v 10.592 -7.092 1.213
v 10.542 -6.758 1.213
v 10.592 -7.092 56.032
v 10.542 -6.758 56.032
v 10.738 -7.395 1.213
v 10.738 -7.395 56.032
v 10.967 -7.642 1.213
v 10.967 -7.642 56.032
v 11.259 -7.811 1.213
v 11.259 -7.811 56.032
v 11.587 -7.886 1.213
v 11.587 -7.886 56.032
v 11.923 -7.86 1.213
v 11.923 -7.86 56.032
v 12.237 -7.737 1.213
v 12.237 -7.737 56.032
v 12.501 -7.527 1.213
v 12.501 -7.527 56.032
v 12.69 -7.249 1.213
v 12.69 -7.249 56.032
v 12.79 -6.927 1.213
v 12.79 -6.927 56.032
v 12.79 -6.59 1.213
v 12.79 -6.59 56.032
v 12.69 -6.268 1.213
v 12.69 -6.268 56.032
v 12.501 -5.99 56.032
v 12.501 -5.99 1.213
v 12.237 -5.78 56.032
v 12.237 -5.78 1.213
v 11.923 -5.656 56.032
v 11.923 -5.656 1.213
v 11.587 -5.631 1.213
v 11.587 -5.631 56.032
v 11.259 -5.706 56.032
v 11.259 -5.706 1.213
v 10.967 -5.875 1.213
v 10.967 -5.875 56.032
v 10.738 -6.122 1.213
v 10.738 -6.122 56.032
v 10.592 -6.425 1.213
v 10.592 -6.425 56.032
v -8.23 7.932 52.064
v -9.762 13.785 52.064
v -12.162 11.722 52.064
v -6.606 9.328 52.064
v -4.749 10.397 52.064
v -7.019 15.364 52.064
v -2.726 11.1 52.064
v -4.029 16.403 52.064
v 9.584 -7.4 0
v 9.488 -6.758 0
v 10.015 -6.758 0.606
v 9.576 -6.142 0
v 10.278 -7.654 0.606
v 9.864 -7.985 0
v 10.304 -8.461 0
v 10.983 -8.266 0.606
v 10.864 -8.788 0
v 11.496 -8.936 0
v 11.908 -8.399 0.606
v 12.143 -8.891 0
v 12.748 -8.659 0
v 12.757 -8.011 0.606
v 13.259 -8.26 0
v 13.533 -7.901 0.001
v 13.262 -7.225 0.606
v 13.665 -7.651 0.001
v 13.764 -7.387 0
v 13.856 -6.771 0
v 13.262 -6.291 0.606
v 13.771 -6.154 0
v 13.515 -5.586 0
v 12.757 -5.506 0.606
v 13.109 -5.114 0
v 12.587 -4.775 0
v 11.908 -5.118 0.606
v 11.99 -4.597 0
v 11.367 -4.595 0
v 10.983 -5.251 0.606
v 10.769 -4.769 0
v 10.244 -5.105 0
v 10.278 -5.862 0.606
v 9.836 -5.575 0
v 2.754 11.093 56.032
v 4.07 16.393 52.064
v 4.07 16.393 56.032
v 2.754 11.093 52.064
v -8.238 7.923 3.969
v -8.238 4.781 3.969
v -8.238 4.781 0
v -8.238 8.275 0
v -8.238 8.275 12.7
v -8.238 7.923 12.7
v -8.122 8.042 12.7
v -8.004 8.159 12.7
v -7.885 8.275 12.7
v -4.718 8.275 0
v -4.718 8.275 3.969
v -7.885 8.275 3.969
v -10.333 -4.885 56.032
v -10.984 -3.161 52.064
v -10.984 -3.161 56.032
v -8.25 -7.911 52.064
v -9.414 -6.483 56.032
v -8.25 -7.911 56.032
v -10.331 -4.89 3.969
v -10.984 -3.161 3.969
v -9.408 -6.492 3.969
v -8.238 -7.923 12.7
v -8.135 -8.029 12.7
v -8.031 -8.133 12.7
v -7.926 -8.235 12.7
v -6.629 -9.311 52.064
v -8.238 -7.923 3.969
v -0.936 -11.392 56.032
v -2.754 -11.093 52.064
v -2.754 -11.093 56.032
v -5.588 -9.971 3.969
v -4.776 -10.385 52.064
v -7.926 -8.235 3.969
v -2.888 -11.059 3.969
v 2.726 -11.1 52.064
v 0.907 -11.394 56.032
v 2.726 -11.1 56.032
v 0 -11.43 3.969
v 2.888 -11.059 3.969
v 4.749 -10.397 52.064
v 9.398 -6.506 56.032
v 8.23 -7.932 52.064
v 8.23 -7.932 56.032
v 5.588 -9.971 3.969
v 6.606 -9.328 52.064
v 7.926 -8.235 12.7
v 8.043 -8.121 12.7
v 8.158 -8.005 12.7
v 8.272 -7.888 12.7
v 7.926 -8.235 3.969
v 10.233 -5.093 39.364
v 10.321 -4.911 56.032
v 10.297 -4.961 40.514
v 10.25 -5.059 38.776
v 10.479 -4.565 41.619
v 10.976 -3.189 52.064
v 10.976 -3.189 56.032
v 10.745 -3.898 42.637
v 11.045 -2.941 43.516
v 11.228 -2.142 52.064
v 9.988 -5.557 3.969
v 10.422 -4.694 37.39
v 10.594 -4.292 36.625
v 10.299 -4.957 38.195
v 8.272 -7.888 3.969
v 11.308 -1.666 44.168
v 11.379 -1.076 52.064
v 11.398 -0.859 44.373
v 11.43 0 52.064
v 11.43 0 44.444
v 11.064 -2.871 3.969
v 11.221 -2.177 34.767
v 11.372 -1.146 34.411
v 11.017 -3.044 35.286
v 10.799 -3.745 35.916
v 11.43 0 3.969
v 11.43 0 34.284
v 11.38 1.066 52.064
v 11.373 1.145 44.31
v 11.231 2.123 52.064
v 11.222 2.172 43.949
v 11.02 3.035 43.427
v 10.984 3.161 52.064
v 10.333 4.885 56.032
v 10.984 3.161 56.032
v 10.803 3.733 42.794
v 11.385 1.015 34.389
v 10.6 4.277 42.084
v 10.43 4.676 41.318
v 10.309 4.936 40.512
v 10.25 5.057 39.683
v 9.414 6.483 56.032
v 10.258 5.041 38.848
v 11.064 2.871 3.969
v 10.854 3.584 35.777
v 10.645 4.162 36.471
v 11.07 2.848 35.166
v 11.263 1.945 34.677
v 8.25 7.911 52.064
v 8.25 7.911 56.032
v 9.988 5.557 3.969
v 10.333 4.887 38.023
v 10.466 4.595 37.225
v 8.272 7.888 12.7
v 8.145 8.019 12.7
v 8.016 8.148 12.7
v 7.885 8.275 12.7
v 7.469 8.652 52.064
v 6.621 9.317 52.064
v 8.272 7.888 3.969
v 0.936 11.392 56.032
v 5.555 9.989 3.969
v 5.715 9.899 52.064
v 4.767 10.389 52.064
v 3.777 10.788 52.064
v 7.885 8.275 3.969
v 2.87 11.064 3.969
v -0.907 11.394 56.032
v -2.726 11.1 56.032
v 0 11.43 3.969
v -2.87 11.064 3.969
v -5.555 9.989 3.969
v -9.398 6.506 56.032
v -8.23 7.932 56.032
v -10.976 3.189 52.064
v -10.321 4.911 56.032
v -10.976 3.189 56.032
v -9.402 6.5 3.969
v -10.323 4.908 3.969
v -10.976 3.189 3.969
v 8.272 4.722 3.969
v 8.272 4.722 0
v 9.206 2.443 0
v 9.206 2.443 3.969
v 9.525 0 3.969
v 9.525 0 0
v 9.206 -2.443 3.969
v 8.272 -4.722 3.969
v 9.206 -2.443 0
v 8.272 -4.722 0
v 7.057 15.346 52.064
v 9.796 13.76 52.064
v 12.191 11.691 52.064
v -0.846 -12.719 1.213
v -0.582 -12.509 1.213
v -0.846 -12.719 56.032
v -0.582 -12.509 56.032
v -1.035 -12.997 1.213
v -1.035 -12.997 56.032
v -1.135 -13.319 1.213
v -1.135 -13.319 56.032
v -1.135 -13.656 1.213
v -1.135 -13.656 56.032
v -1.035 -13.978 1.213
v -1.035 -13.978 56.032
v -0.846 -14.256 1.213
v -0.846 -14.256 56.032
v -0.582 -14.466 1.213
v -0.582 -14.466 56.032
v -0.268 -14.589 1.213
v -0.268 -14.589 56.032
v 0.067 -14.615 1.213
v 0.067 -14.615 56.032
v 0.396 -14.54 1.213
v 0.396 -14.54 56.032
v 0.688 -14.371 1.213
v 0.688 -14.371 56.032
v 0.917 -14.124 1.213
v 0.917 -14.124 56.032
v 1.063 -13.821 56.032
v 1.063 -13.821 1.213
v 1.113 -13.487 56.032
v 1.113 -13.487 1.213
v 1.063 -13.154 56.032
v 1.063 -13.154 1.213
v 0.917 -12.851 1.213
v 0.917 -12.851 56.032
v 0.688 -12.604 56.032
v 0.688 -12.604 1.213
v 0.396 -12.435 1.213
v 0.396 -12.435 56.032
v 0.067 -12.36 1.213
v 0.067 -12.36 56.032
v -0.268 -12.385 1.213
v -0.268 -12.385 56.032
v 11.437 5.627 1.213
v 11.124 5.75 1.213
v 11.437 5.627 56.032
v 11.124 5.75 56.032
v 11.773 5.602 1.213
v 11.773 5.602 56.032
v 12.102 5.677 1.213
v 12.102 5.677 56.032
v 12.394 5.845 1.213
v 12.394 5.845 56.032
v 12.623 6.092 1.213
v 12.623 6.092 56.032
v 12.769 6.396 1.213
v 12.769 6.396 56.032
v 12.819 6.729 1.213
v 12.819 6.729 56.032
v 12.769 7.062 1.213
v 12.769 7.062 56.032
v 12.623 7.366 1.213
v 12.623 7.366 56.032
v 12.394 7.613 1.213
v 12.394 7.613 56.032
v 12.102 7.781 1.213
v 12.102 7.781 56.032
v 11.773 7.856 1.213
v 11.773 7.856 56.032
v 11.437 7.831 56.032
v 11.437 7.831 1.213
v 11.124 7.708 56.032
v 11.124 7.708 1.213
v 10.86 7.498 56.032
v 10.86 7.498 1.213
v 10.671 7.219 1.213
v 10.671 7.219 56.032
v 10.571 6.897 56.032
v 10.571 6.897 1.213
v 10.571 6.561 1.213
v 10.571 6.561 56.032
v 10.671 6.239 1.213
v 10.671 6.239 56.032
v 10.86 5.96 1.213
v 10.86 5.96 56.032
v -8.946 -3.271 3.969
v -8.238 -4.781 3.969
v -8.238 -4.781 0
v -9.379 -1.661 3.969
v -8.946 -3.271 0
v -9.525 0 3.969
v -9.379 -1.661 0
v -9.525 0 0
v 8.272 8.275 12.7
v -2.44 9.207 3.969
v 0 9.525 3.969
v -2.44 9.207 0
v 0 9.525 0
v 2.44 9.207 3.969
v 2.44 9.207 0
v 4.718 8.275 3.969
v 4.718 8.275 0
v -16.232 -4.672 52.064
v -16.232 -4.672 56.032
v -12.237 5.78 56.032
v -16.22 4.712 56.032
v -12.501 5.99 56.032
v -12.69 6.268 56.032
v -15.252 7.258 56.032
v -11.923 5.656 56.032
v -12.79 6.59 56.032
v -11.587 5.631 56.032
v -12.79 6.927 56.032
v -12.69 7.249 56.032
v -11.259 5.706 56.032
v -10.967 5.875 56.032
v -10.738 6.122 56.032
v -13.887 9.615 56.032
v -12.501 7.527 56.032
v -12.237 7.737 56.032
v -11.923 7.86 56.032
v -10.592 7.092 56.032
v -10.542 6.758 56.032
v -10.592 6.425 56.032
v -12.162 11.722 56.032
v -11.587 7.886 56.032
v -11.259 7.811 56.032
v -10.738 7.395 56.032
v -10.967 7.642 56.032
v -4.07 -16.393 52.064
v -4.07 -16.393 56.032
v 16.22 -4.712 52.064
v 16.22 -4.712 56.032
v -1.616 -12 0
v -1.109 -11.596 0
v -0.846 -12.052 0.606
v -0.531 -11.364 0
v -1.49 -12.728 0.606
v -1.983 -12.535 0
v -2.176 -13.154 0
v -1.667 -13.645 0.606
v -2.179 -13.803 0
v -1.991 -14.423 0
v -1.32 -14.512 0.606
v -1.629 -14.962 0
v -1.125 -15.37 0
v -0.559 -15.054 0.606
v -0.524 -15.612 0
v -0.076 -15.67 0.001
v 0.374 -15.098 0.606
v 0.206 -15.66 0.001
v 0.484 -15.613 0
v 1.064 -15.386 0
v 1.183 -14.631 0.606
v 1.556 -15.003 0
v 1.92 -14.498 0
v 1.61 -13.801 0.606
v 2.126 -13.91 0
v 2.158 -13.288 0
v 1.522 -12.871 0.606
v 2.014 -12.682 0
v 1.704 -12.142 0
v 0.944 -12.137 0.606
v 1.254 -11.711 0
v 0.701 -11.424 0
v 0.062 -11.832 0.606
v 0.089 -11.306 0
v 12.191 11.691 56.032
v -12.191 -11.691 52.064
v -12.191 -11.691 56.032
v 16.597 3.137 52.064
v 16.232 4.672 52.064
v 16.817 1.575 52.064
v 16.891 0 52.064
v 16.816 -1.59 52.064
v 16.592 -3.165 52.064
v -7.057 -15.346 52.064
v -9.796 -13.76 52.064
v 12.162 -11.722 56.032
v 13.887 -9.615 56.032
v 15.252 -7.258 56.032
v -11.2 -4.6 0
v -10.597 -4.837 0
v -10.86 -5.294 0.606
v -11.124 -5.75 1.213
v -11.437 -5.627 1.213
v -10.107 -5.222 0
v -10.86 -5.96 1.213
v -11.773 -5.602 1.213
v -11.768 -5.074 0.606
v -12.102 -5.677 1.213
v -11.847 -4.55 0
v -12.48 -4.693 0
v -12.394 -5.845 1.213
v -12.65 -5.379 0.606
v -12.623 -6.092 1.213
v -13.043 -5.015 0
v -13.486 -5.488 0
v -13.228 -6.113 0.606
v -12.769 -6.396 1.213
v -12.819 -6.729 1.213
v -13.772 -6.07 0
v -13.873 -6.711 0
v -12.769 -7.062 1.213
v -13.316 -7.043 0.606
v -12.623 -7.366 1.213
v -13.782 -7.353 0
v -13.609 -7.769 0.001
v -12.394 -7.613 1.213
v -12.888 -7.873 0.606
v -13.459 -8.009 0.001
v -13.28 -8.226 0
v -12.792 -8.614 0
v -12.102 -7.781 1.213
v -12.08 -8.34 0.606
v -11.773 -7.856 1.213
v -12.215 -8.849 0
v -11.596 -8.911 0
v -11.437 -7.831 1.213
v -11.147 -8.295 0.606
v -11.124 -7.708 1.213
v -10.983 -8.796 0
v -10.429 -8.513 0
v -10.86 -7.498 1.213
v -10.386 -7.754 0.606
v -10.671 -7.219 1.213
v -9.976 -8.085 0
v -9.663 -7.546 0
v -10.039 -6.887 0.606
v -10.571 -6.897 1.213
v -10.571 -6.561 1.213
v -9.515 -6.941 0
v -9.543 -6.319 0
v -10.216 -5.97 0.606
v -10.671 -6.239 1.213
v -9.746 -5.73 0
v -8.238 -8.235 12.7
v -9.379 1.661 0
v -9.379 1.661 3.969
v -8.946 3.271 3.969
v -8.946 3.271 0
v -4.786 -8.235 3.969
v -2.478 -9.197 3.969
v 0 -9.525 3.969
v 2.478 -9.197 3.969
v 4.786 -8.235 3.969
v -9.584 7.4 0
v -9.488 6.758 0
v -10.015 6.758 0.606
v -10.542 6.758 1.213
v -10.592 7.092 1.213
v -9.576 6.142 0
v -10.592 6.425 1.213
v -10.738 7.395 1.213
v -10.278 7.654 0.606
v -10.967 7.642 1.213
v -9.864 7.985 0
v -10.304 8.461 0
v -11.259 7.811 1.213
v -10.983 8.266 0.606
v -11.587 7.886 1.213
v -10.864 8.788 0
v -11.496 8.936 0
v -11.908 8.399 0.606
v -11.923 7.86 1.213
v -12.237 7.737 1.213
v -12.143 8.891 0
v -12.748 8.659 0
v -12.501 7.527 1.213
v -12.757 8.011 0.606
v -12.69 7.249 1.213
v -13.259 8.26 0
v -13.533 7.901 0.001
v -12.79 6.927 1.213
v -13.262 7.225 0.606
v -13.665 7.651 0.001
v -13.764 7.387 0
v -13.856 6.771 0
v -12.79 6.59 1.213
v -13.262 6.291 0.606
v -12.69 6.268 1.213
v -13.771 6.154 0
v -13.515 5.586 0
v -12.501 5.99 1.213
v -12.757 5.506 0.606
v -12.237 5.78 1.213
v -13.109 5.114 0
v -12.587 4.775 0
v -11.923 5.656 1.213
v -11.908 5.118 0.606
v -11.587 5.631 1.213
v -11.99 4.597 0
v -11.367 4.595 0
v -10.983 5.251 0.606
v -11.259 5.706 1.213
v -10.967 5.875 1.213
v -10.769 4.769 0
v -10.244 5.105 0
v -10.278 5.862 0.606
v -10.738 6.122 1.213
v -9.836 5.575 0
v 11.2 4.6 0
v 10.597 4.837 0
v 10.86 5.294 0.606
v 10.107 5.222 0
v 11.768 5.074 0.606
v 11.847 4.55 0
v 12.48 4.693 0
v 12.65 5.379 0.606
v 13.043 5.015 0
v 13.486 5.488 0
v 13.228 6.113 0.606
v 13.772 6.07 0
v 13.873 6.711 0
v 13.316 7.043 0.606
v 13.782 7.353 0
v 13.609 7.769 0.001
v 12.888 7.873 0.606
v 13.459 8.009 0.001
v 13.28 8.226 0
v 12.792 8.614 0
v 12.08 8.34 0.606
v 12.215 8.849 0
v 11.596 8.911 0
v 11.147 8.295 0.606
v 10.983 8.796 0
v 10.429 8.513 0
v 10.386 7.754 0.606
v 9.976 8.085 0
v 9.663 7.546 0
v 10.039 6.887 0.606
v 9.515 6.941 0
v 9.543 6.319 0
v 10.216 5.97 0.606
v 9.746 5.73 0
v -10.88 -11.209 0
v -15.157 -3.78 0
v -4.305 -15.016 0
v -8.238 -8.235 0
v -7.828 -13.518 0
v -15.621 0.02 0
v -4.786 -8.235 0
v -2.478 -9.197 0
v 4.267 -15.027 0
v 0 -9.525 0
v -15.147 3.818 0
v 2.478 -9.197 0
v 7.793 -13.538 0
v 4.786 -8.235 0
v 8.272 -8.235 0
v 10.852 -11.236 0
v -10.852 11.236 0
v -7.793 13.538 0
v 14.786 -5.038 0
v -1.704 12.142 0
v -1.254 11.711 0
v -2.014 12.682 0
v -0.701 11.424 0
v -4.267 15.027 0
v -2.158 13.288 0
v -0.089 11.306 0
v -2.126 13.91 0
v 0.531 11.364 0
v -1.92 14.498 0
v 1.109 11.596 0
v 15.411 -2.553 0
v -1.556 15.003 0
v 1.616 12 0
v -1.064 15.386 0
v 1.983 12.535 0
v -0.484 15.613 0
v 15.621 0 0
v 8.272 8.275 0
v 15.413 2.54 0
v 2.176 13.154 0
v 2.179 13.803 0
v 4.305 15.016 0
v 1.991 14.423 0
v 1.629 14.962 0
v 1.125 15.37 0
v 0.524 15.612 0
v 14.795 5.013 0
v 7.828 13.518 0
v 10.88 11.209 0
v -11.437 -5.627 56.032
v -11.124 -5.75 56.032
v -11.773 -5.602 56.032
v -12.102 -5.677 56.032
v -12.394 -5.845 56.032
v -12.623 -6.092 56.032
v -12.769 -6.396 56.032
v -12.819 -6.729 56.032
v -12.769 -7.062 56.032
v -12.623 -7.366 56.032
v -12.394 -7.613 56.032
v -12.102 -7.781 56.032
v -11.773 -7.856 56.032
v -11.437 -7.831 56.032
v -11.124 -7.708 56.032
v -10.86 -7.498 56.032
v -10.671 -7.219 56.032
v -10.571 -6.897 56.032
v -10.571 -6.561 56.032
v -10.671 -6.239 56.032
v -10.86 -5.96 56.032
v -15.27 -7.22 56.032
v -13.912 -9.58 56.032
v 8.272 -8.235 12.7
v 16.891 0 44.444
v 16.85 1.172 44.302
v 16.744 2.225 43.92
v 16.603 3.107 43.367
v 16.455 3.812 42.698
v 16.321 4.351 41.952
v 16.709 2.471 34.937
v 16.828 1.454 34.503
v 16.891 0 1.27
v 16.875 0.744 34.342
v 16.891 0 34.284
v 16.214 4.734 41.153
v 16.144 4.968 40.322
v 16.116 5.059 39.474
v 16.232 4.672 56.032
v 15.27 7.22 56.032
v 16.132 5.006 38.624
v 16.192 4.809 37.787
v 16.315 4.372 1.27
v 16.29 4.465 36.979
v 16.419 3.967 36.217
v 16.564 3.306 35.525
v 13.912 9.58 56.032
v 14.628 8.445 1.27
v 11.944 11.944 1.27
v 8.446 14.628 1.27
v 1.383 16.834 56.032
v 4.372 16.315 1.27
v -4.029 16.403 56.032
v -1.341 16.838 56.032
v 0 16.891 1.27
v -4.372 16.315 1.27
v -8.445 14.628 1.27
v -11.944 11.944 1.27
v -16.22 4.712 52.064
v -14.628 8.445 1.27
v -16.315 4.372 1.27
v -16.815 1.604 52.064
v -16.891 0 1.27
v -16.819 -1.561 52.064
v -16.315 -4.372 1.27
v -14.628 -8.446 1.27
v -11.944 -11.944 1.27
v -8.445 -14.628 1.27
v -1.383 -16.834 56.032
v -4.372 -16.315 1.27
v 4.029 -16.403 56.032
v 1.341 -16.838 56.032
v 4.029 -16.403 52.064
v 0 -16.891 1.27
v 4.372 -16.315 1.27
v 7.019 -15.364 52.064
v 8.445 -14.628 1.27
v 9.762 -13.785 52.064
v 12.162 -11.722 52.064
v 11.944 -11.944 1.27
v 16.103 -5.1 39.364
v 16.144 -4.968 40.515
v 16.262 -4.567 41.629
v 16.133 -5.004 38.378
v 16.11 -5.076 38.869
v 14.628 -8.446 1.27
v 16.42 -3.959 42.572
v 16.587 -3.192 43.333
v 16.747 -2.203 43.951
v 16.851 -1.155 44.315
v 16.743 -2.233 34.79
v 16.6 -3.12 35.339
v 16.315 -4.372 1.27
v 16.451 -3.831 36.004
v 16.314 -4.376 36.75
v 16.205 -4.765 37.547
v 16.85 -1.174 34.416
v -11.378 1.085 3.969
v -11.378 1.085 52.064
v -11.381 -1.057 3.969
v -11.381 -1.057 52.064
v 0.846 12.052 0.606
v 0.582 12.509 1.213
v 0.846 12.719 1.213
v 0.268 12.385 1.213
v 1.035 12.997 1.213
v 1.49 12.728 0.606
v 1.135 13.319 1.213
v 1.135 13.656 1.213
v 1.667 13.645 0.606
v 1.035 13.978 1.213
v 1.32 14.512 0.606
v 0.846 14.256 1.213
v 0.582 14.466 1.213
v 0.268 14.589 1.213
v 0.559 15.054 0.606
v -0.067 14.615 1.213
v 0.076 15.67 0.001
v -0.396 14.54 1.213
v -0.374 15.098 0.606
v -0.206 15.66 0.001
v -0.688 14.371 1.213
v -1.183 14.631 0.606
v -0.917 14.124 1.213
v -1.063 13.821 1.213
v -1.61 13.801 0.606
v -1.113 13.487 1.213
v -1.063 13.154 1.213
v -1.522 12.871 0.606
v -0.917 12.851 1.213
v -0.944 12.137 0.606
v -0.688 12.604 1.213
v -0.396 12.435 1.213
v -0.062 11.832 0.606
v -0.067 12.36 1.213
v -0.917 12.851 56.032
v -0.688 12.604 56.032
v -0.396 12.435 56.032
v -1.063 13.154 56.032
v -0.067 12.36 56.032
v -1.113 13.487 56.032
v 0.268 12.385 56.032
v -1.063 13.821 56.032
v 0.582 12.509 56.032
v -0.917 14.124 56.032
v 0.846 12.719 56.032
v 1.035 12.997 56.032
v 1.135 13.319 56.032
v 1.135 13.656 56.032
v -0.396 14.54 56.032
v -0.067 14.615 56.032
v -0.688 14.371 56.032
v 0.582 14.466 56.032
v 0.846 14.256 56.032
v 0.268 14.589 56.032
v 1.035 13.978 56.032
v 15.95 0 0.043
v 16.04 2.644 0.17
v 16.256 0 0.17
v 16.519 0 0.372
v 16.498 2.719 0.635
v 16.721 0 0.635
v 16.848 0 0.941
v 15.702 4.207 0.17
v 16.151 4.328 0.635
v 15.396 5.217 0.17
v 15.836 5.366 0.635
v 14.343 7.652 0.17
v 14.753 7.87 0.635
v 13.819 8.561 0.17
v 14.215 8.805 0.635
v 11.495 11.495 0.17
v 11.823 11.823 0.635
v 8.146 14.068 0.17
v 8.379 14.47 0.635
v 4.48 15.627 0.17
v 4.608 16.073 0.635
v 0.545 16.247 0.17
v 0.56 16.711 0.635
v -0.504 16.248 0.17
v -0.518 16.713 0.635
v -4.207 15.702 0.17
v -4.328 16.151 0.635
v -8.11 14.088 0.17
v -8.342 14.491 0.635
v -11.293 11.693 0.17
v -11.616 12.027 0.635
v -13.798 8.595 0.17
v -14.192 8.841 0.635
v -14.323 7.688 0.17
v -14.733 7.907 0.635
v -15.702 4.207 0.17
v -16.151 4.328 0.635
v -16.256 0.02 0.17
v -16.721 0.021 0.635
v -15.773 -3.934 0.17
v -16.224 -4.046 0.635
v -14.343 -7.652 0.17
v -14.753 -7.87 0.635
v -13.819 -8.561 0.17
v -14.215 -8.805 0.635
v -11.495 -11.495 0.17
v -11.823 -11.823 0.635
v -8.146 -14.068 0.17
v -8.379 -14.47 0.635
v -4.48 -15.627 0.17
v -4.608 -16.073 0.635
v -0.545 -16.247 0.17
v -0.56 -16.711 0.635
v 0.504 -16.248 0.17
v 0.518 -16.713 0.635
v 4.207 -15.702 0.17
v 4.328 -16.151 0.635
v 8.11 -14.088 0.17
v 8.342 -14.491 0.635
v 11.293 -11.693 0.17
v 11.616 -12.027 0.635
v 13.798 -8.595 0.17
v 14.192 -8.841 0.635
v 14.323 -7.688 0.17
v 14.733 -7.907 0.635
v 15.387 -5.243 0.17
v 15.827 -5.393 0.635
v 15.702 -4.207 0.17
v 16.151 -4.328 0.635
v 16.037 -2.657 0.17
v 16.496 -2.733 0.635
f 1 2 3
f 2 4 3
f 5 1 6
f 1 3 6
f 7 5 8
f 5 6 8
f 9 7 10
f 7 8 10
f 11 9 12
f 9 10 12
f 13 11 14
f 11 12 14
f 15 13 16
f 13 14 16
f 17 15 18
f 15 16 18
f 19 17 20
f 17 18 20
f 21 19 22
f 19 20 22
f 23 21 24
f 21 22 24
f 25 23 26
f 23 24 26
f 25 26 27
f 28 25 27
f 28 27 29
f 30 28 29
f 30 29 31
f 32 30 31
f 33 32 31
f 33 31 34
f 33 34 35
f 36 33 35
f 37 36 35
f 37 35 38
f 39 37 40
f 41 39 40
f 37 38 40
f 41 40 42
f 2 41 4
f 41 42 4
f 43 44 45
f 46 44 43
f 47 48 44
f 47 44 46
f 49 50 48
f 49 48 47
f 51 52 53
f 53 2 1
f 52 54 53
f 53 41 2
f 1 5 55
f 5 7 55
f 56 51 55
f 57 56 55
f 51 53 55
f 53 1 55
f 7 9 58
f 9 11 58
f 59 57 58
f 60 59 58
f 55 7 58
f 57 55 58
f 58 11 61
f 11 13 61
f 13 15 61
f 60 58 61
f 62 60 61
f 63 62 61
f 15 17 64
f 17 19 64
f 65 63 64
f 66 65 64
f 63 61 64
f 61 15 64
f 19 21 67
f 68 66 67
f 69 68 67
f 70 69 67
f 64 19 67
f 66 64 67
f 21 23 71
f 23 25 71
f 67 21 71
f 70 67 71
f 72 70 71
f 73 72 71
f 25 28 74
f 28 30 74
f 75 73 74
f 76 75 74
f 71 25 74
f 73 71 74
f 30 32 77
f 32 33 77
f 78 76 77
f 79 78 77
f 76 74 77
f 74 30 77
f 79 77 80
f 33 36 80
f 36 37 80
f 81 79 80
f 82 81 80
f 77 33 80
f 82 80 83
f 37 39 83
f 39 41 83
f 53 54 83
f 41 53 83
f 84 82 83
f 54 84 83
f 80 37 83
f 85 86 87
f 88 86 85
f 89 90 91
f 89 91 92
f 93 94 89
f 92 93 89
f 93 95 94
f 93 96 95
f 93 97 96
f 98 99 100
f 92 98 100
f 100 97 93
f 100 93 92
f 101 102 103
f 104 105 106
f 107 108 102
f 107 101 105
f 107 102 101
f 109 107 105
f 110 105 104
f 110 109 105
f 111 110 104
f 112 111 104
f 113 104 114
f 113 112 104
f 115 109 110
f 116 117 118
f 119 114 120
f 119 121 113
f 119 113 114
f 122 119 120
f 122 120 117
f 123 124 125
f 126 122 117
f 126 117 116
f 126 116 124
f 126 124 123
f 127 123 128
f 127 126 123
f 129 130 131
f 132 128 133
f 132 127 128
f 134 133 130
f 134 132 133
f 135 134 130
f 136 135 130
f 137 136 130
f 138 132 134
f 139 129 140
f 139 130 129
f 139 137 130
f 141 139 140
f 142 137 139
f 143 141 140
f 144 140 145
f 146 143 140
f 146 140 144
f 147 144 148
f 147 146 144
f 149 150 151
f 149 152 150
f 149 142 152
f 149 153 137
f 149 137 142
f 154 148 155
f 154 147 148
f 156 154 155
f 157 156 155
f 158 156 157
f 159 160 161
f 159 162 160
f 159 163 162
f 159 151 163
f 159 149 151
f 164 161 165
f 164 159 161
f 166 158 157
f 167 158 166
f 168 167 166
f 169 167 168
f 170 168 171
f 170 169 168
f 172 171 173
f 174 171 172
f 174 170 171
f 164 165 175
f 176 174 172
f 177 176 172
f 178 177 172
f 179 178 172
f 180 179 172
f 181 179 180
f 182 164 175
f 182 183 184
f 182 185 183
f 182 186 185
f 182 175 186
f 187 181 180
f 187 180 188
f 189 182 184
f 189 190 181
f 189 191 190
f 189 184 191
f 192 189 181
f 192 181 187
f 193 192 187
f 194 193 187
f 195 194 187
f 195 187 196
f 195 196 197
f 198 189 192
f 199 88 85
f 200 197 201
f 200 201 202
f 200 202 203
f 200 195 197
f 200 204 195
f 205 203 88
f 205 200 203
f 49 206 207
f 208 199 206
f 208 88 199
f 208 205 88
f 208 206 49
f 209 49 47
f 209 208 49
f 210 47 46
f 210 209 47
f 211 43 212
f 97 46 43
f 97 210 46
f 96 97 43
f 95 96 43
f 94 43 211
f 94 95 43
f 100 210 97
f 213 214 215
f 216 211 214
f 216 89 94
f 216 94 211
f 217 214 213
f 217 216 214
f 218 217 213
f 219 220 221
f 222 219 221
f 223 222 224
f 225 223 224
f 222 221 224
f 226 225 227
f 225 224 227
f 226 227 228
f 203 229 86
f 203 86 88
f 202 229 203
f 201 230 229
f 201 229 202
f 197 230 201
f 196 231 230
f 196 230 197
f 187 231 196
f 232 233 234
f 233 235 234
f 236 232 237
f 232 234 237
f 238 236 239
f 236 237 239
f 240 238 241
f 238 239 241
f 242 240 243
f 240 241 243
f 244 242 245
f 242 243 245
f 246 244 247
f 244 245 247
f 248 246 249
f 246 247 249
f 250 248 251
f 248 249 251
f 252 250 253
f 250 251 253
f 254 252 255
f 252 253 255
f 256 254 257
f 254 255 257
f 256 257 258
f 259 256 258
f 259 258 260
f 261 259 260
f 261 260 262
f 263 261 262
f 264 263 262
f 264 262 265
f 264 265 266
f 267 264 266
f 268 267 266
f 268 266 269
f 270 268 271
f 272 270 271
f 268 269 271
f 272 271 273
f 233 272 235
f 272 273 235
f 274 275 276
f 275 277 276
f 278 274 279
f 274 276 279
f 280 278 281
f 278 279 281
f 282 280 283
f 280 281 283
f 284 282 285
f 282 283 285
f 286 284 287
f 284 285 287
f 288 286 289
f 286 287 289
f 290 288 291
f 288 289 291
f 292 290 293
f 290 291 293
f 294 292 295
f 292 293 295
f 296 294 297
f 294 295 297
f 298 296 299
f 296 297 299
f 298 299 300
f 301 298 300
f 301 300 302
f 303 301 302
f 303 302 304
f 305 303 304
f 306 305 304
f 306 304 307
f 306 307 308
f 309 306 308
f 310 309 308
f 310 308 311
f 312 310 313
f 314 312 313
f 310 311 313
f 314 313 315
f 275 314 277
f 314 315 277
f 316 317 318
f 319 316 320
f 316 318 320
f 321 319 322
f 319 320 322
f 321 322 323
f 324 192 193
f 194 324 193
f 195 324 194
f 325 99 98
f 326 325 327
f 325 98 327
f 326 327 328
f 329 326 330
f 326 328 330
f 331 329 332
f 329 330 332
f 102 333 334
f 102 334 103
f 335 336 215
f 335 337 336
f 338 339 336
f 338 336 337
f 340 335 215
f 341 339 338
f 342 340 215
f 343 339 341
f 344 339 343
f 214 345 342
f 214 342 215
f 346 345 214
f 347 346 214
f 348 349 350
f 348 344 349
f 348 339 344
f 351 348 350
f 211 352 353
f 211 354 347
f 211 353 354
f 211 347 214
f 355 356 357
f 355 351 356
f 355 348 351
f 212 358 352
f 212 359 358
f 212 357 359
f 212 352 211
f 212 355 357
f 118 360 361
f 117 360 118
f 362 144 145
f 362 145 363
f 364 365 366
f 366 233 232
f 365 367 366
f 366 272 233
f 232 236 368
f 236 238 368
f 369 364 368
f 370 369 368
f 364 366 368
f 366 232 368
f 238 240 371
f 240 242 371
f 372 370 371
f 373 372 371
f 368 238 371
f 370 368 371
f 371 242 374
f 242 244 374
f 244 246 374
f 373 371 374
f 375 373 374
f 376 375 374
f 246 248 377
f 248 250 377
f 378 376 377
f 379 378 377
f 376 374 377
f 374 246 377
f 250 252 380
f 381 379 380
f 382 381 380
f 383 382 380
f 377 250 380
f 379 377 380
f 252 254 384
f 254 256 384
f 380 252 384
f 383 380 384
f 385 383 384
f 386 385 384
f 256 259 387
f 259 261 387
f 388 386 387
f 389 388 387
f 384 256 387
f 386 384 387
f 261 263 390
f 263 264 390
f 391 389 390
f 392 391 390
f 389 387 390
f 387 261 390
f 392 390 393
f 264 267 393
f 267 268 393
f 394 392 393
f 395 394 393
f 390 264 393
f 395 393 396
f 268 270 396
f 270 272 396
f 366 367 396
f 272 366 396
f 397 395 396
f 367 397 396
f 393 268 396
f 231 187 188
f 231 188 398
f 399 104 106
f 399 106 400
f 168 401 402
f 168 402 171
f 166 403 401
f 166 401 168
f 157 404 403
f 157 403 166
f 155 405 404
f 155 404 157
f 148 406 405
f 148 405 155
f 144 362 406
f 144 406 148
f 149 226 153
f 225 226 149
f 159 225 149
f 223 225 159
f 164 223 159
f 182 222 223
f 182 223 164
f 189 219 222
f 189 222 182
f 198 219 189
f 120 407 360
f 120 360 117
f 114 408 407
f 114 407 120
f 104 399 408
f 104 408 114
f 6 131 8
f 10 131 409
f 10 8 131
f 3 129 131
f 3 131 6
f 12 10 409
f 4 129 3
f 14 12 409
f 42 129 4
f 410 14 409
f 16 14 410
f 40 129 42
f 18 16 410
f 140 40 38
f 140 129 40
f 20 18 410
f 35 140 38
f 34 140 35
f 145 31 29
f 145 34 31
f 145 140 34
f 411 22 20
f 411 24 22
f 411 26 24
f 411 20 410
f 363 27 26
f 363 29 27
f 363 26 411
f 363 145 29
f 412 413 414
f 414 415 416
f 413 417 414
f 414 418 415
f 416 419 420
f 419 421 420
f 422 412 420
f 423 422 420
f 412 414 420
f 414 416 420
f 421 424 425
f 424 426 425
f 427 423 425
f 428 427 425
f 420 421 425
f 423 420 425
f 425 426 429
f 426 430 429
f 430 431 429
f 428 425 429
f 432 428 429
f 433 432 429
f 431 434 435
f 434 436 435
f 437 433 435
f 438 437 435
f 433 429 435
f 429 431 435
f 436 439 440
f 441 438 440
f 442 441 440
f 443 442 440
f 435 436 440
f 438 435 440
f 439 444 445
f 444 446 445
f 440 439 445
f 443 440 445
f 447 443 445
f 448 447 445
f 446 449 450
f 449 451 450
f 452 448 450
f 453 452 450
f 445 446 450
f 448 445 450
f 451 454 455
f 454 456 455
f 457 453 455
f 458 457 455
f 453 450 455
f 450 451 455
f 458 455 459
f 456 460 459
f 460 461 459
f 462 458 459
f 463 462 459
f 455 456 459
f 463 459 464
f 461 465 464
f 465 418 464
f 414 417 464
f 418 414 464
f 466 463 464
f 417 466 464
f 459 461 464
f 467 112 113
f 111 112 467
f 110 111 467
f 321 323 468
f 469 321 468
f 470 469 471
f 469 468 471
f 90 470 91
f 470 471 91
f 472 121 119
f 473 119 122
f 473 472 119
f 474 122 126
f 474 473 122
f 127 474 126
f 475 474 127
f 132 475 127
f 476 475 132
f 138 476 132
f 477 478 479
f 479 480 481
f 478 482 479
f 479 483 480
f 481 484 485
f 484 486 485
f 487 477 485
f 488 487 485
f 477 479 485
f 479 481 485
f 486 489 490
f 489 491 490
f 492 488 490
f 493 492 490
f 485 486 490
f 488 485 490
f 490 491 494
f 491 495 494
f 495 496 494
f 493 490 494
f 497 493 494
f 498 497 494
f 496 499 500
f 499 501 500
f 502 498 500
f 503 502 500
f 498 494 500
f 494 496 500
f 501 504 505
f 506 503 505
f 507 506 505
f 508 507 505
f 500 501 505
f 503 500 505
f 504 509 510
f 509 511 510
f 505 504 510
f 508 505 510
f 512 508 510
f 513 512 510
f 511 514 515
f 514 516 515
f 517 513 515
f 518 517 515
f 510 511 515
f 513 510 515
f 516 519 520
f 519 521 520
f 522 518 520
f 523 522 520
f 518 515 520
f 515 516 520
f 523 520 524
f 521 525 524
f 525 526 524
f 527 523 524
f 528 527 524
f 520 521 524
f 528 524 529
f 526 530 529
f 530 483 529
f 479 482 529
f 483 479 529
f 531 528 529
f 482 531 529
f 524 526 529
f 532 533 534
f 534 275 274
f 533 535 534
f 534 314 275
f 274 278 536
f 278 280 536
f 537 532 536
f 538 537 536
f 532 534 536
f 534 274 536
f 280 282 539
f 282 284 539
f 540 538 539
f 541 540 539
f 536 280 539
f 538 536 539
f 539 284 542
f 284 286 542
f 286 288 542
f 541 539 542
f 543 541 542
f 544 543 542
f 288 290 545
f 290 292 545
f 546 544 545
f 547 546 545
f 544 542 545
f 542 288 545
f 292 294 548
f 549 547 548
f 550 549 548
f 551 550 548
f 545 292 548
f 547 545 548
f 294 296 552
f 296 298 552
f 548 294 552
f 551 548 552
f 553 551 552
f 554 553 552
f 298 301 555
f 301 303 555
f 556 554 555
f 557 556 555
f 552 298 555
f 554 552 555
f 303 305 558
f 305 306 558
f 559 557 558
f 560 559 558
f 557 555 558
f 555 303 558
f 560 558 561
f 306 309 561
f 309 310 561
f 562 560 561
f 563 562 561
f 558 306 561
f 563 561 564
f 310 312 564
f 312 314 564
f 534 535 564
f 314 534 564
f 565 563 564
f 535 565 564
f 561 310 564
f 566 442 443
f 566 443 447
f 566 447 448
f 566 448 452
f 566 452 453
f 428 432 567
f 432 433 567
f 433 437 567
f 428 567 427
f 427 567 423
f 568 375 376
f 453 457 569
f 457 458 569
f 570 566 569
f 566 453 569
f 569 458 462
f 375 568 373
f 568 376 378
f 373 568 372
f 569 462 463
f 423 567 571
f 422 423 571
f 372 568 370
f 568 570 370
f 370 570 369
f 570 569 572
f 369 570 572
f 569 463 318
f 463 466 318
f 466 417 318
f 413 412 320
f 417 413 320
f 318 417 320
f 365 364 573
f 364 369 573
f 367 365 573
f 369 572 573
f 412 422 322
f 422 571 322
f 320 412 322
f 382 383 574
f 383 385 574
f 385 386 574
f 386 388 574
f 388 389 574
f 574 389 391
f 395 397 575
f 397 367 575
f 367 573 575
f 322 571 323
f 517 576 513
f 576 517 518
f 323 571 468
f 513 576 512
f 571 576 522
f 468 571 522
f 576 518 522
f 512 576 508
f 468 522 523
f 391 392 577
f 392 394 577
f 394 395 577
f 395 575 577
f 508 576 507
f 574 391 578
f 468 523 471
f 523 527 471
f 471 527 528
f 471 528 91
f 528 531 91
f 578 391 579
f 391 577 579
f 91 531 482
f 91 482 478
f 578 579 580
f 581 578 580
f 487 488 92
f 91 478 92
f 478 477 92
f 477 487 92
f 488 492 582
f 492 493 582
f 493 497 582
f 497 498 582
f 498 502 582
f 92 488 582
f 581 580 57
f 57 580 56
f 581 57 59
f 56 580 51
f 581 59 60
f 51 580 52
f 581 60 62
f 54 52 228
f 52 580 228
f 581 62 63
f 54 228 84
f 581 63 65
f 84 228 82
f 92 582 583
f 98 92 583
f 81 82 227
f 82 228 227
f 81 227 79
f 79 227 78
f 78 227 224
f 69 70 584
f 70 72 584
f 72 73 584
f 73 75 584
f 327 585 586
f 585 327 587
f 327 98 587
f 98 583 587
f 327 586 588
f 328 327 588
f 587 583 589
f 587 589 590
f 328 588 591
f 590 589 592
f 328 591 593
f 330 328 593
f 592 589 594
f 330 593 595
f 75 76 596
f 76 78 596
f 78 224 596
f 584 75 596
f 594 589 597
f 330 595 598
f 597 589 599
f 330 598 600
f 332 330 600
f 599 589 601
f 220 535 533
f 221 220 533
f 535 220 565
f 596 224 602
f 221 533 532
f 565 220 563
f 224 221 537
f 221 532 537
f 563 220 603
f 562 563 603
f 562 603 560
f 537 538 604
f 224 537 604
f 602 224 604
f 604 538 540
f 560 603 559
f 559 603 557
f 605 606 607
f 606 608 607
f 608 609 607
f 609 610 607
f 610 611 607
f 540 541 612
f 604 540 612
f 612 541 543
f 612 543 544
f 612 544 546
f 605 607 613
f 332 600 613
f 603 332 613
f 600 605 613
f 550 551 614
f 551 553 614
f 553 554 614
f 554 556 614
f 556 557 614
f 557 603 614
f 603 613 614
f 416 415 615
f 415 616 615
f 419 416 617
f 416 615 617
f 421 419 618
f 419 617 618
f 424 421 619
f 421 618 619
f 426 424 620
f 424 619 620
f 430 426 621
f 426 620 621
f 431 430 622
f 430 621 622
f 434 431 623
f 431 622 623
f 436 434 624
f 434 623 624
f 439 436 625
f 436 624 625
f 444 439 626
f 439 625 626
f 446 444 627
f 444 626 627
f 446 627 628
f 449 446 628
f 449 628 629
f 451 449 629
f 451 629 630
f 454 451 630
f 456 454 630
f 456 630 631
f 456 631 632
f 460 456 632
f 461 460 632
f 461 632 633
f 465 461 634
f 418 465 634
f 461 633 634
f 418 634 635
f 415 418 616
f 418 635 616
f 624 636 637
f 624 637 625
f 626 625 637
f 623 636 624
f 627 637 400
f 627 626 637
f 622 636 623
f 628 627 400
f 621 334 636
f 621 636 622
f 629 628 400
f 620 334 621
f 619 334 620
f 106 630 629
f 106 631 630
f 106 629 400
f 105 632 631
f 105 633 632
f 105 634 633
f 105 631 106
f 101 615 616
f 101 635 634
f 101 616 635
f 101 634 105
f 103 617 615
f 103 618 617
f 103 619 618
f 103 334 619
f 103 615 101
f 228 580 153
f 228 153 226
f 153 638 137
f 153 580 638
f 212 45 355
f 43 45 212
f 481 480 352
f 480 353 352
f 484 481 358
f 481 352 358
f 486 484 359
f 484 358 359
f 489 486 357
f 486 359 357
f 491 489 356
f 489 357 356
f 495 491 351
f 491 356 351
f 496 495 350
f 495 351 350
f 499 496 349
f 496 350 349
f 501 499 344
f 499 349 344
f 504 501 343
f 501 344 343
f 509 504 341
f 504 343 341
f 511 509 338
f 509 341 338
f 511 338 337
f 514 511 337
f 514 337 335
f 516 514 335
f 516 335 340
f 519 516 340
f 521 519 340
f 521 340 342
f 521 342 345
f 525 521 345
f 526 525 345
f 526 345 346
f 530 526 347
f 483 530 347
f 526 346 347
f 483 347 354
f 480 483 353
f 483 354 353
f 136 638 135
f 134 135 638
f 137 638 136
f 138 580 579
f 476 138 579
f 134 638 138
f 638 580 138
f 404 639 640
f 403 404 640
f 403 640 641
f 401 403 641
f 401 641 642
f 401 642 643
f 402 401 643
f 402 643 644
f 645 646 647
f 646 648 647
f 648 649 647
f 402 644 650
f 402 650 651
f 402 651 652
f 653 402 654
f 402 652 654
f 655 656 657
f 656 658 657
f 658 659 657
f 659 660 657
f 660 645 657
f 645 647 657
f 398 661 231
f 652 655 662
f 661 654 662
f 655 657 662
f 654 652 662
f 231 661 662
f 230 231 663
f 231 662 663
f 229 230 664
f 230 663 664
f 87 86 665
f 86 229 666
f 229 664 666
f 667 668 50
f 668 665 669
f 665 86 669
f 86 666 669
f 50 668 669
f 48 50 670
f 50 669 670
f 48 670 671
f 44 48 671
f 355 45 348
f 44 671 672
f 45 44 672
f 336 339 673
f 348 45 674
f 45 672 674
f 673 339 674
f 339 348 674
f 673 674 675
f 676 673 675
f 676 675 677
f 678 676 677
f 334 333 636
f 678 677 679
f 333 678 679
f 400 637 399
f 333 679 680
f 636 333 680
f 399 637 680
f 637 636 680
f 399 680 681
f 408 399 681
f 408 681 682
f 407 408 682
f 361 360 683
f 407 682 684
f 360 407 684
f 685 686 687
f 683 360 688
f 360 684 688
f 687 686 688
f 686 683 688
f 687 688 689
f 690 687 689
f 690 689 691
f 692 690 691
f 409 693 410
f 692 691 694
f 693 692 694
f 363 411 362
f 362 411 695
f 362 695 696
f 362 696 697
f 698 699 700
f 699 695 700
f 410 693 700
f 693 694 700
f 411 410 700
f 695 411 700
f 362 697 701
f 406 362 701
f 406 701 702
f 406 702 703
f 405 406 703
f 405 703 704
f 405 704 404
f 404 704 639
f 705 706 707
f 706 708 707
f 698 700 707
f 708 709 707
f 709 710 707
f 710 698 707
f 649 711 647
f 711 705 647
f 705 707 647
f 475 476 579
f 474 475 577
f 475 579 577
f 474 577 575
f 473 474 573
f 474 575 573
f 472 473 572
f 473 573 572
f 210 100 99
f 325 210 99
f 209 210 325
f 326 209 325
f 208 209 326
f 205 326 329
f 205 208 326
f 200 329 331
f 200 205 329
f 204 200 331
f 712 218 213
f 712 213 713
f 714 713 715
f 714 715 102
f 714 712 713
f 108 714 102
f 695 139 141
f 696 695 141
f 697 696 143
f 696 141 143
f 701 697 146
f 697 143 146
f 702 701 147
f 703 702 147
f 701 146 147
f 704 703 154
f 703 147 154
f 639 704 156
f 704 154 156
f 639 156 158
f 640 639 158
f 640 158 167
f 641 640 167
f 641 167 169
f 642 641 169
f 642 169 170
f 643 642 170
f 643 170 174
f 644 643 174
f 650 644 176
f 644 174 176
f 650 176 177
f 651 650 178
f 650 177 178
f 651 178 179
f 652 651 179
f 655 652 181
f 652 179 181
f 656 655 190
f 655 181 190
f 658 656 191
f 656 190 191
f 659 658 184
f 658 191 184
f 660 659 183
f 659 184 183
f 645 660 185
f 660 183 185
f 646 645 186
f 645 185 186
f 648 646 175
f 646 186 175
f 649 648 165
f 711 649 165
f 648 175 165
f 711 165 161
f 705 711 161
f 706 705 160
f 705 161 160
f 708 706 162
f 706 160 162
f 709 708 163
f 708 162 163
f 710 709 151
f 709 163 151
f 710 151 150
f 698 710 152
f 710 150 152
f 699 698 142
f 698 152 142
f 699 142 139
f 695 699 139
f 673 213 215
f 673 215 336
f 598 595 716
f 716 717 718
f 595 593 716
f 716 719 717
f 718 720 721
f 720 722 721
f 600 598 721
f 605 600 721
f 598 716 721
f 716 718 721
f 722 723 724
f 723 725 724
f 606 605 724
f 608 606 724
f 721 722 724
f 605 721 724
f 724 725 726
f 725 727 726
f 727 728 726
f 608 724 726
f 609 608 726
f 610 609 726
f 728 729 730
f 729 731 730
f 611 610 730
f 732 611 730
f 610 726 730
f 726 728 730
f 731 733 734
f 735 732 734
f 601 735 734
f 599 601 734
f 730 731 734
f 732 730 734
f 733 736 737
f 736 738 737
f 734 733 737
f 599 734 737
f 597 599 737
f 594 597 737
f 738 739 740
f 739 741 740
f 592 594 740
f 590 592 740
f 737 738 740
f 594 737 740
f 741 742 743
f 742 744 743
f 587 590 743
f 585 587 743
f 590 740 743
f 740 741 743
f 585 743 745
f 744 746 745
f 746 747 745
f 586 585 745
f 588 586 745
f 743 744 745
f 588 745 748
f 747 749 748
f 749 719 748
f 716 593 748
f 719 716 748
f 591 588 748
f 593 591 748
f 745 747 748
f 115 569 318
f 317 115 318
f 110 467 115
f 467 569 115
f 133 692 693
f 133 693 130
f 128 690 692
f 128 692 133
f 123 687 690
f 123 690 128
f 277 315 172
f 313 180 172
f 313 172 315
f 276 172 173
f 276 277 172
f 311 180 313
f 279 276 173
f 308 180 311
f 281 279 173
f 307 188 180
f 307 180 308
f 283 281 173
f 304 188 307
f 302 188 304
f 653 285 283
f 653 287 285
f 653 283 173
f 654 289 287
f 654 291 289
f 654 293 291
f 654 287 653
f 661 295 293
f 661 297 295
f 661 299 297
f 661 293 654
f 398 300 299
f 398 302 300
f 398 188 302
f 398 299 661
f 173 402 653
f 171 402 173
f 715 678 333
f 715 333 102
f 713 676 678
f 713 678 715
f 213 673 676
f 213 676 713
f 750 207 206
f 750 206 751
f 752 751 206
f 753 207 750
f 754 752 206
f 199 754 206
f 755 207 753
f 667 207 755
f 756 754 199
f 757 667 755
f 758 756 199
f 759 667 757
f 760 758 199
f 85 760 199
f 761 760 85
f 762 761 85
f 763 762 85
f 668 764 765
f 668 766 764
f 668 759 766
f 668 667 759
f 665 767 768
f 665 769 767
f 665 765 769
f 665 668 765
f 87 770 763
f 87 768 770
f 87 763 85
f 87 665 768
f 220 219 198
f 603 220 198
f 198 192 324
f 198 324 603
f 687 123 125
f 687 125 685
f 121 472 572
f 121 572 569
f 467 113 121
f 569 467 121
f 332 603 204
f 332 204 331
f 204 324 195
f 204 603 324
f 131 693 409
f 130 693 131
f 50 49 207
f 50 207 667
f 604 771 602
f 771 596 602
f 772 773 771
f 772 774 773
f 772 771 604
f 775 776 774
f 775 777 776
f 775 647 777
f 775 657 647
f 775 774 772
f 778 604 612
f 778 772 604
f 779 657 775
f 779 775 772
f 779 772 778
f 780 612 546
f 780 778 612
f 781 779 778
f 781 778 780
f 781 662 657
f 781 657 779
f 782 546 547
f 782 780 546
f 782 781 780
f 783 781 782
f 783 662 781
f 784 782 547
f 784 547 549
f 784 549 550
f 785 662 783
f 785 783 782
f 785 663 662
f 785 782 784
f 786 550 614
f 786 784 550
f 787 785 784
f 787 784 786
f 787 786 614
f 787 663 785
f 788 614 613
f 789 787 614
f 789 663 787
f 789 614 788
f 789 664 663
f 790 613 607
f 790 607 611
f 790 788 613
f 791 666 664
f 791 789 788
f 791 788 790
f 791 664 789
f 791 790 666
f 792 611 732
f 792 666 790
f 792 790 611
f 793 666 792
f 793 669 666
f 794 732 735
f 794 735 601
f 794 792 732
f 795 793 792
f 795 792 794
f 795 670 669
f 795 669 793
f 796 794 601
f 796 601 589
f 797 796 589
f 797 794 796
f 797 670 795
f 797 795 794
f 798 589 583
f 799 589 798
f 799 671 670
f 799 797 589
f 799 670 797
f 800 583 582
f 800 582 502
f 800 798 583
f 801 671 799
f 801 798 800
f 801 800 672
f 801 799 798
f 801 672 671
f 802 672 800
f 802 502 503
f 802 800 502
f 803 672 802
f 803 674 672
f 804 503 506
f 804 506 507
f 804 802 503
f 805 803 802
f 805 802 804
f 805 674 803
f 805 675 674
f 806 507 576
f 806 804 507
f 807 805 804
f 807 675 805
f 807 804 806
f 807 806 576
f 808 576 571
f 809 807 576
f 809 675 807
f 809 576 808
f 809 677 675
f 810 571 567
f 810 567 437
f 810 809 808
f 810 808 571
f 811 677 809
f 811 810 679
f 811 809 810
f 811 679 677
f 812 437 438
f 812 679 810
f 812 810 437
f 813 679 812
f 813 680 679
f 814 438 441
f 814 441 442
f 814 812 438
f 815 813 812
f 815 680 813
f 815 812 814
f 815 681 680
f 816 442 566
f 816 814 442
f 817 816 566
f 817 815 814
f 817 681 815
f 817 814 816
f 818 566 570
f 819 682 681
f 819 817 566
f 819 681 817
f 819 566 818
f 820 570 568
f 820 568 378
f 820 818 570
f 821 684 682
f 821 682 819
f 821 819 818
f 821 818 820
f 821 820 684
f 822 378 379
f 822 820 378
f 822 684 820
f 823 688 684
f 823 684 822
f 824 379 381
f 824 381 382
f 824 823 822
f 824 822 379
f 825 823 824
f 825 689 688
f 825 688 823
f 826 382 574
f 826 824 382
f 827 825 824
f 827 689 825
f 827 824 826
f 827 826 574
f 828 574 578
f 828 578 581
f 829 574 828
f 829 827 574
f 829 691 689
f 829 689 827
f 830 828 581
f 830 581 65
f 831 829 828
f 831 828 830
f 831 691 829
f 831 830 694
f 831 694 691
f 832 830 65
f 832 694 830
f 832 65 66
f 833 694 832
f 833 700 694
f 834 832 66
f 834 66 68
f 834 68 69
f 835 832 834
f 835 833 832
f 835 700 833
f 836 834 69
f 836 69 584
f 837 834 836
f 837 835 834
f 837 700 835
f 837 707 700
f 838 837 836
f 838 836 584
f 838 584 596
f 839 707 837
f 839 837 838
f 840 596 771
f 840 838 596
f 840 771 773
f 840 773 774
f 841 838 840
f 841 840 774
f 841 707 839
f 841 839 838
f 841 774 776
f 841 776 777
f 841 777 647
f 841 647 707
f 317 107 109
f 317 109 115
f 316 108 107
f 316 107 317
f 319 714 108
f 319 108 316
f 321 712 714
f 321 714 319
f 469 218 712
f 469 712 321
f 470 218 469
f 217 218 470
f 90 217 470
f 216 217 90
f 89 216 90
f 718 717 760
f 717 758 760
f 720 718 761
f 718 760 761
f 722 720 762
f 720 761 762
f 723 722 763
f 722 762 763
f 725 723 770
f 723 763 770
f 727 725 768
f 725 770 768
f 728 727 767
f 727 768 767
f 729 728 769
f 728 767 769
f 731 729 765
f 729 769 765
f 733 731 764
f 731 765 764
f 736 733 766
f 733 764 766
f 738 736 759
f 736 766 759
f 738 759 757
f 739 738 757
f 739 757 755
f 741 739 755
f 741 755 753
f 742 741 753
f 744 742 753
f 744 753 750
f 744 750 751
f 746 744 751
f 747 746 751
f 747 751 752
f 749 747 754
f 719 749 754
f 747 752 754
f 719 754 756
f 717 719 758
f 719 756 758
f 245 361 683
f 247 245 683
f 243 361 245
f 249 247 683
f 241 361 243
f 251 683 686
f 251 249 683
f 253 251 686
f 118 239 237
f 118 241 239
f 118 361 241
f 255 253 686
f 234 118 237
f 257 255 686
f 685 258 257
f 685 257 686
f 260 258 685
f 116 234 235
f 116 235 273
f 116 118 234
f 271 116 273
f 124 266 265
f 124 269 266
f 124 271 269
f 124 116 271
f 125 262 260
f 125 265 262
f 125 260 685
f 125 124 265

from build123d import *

# Parameters (mm, degrees)
SKETCH1_R                                      = 16.891
BOSS_EXTRUDE1_DEPTH                            = 56.0324
SKETCH9_R                                      = 9.525
CUT_EXTRUDE6_DEPTH                             = 61.911752657
SKETCH10_R                                     = 11.43
BOSS_EXTRUDE2_DEPTH                            = 19.05
CUT_EXTRUDE7_START                             = -52.06365
SKETCH11_R                                     = 9.525
CUT_EXTRUDE7_DEPTH                             = 52.06365
CUT_EXTRUDE8_START                             = -3.96875
CUT_EXTRUDE8_DEPTH                             = 3.96875
CSK_FOR_2_FLAT_HEAD_MACHINE_SCREW1_D           = 2.2606
CSK_FOR_2_FLAT_HEAD_MACHINE_SCREW1_CSINK_D     = 4.3688
CSK_FOR_2_FLAT_HEAD_MACHINE_SCREW1_CSINK_ANGLE = 82
CIRPATTERN1_COUNT                              = 6
F_1_2_0_4_DIAMETER_HOLE1_D                     = 10.16
F_1_2_0_4_DIAMETER_HOLE1_DEPTH                 = 12.7
F_1_2_0_4_DIAMETER_HOLE1_TIP                   = 3.052371945
FILLET1_R                                      = 1.27
CUT_EXTRUDE9_START                             = -12.7
SKETCH17_W                                     = 16.51
SKETCH17_H                                     = 16.51
CUT_EXTRUDE9_DEPTH                             = 12.7


with BuildPart() as part:
    # Sketch1 → Boss-Extrude1 (new body)
    with BuildSketch(Plane.XY):
        Circle(SKETCH1_R)
    extrude(amount=BOSS_EXTRUDE1_DEPTH)

    # Sketch9 → Cut-Extrude6 (cut, through all)
    with BuildSketch(Plane(origin=(0, 0, 0), x_dir=(-1, 0, 0), z_dir=(0, 0, -1))):
        Circle(SKETCH9_R)
        with BuildLine():
            ThreePointArc((-5.359640753, -7.874), (0, -9.525), (5.359640753, -7.874))
            Line((5.359640753, -7.874), (-5.359640753, -7.874))
        make_face()
        with BuildLine():
            ThreePointArc((-7.874, 5.359640753), (-9.525, 0), (-7.874, -5.359640753))
            Line((-7.874, -5.359640753), (-7.874, 5.359640753))
        make_face()
        with BuildLine():
            Line((-5.359640753, 7.874), (5.359640753, 7.874))
            ThreePointArc((5.359640753, 7.874), (0, 9.525), (-5.359640753, 7.874))
        make_face()
        with BuildLine():
            Line((7.874, 5.359640753), (7.874, -5.359640753))
            ThreePointArc((7.874, -5.359640753), (9.102897204, -2.804084075), (9.525, 0))
            ThreePointArc((9.525, 0), (9.102897204, 2.804084075), (7.874, 5.359640753))
        make_face()
    extrude(amount=-CUT_EXTRUDE6_DEPTH, mode=Mode.SUBTRACT)

    # Sketch10 → Boss-Extrude2 (add)
    # profile 1 of 2: a face of its own
    with BuildSketch(Plane(origin=(0, 0, 0), x_dir=(-1, 0, 0), z_dir=(0, 0, -1))):
        Circle(SKETCH10_R)
        with BuildLine():
            ThreePointArc((-5.359640753, -7.874), (-4.453933477, 8.419507206), (9.525, 0))
            ThreePointArc((9.525, 0), (8.419507206, -4.453933477), (5.359640753, -7.874))
            ThreePointArc((5.359640753, -7.874), (0, -9.525), (-5.359640753, -7.874))
        make_face(mode=Mode.SUBTRACT)
    # profile 2 of 2: a face of its own
    with BuildSketch(Plane(origin=(0, 0, 0), x_dir=(-1, 0, 0), z_dir=(0, 0, -1))):
        Circle(SKETCH10_R)
        with BuildLine():
            ThreePointArc((-5.359640753, -7.874), (-4.453933477, 8.419507206), (9.525, 0))
            ThreePointArc((9.525, 0), (8.419507206, -4.453933477), (5.359640753, -7.874))
            ThreePointArc((5.359640753, -7.874), (0, -9.525), (-5.359640753, -7.874))
        make_face(mode=Mode.SUBTRACT)
    extrude(amount=-BOSS_EXTRUDE2_DEPTH)

    # Sketch11 → Cut-Extrude7 (cut)
    with BuildSketch(Plane.XY.offset(56.0324).offset(CUT_EXTRUDE7_START)):
        with BuildLine():
            Line((-9.153468369, -2.634319991), (-10.984162043, -3.161183989))
            ThreePointArc((-10.984162043, -3.161183989), (1.596234295, -11.317991698), (11.43, 0))
            ThreePointArc((11.43, 0), (1.610471515, 11.315974615), (-10.976173491, 3.188810986))
            Line((-10.976173491, 3.188810986), (-9.146811242, 2.657342489))
            ThreePointArc((-9.146811242, 2.657342489), (1.342059596, 9.429978846), (9.525, 0))
            ThreePointArc((9.525, 0), (1.330195246, -9.431659748), (-9.153468369, -2.634319991))
        make_face()
        with Locations(Location((0, 0, 0), (0, 0, 180))):
            Circle(SKETCH11_R)
        with BuildLine():
            ThreePointArc((-10.984162043, -3.161183989), (-11.297244321, 0.014212394), (-10.976173491, 3.188810986))
            Line((-10.976173491, 3.188810986), (0, 0))
            Line((0, 0), (-10.984162043, -3.161183989))
        make_face()
        with BuildLine():
            ThreePointArc((-10.976173491, 3.188810986), (-11.429990955, 0.014379395), (-10.984162043, -3.161183989))
            ThreePointArc((-10.984162043, -3.161183989), (-11.297244321, 0.014212394), (-10.976173491, 3.188810986))
        make_face()
    extrude(amount=CUT_EXTRUDE7_DEPTH, mode=Mode.SUBTRACT)

    # Sketch11<4> → Cut-Extrude8 (cut)
    with BuildSketch(Plane.XY.offset(56.0324).offset(CUT_EXTRUDE8_START)):
        with BuildLine():
            ThreePointArc((-10.976173491, 3.188810986), (-11.297244321, 0.014212394), (-10.984162043, -3.161183989))
            Line((-10.984162043, -3.161183989), (0, 0))
            Line((0, 0), (-10.976173491, 3.188810986))
        make_face()
        with BuildLine():
            ThreePointArc((-10.976173491, 3.188810986), (-11.429990955, 0.014379395), (-10.984162043, -3.161183989))
            ThreePointArc((-10.984162043, -3.161183989), (-11.297244321, 0.014212394), (-10.976173491, 3.188810986))
        make_face()
        with BuildLine():
            Line((-16.232150575, -4.67152745), (-10.984162043, -3.161183989))
            ThreePointArc((-10.984162043, -3.161183989), (-11.429990955, 0.014379395), (-10.976173491, 3.188810986))
            Line((-10.976173491, 3.188810986), (-16.220345269, 4.712354013))
            ThreePointArc((-16.220345269, 4.712354013), (-16.925737574, 0.021293268), (-16.232150575, -4.67152745))
        make_face()
        with BuildLine():
            Line((0, 0), (-10.984162043, -3.161183989))
            ThreePointArc((-10.984162043, -3.161183989), (1.596234295, -11.317991698), (11.43, 0))
            ThreePointArc((11.43, 0), (1.610471515, 11.315974615), (-10.976173491, 3.188810986))
            Line((-10.976173491, 3.188810986), (0, 0))
        make_face()
    cut_extrude8 = extrude(amount=CUT_EXTRUDE8_DEPTH, mode=Mode.SUBTRACT)

    # CSK for #2 Flat Head Machine Screw1 (through all)
    with Locations(Plane(origin=(0, 0, 0), x_dir=(-1, 0, 0), z_dir=(0, 0, -1))):
        with Locations((11.671937945, 6.75838911)):
            csk_for_2_flat_head_machine_screw1 = CounterSinkHole(CSK_FOR_2_FLAT_HEAD_MACHINE_SCREW1_D / 2, CSK_FOR_2_FLAT_HEAD_MACHINE_SCREW1_CSINK_D / 2, counter_sink_angle=CSK_FOR_2_FLAT_HEAD_MACHINE_SCREW1_CSINK_ANGLE)

    # CirPattern1: Cut-Extrude8, CSK for #2 Flat Head Machine Screw1 ×6 about axis
    cirpattern1_axis = Axis((0, 0, 0), (0, 0, 1))
    add([cut_extrude8.rotate(cirpattern1_axis, i * 360 / CIRPATTERN1_COUNT) for i in range(1, CIRPATTERN1_COUNT)], mode=Mode.SUBTRACT)
    add([csk_for_2_flat_head_machine_screw1.rotate(cirpattern1_axis, i * 360 / CIRPATTERN1_COUNT) for i in range(1, CIRPATTERN1_COUNT)], mode=Mode.SUBTRACT)

    # 1/2 (0.4) Diameter Hole1
    with Locations(Plane(origin=(16.890986634, -0.02124955, 39.36365), x_dir=(0.001258039772, 0.999999208668, 0), z_dir=(0.999999208668, -0.001258039772, 0))):
        with Locations((0, 0)):
            Hole(F_1_2_0_4_DIAMETER_HOLE1_D / 2, depth=F_1_2_0_4_DIAMETER_HOLE1_DEPTH)
            with Locations((0, 0, -(F_1_2_0_4_DIAMETER_HOLE1_DEPTH + F_1_2_0_4_DIAMETER_HOLE1_TIP / 2))):  # 118° drill point
                Cone(0, F_1_2_0_4_DIAMETER_HOLE1_D / 2, F_1_2_0_4_DIAMETER_HOLE1_TIP, mode=Mode.SUBTRACT)

    # Fillet1
    # the kernel refuses this fillet: 1.27 mm, written as the material it takes off along each edge
    with BuildSketch(Plane(origin=(0, 0, 0), x_dir=(1, 0, 0), z_dir=(0, -1, 0))) as fillet1_piece_1:
        with BuildLine():
            CenterArc((16.891 - FILLET1_R, FILLET1_R), FILLET1_R, 270, 90)
            Line((16.891 - FILLET1_R, 0), (16.891, 0))
            Line((16.891, 0), (16.891, FILLET1_R))
        make_face()
    revolve(axis=Axis((0, 0, 0), (0, 0, 1)), mode=Mode.SUBTRACT)

    # Sketch17 → Cut-Extrude9 (cut)
    with BuildSketch(Plane(origin=(0, 0, 0), x_dir=(-1, 0, 0), z_dir=(0, 0, -1)).offset(CUT_EXTRUDE9_START)):
        with Locations((-0.016967686, 0.019651839)):
            Rectangle(SKETCH17_W, SKETCH17_H)
    extrude(amount=CUT_EXTRUDE9_DEPTH, mode=Mode.SUBTRACT)


solid = part.part
